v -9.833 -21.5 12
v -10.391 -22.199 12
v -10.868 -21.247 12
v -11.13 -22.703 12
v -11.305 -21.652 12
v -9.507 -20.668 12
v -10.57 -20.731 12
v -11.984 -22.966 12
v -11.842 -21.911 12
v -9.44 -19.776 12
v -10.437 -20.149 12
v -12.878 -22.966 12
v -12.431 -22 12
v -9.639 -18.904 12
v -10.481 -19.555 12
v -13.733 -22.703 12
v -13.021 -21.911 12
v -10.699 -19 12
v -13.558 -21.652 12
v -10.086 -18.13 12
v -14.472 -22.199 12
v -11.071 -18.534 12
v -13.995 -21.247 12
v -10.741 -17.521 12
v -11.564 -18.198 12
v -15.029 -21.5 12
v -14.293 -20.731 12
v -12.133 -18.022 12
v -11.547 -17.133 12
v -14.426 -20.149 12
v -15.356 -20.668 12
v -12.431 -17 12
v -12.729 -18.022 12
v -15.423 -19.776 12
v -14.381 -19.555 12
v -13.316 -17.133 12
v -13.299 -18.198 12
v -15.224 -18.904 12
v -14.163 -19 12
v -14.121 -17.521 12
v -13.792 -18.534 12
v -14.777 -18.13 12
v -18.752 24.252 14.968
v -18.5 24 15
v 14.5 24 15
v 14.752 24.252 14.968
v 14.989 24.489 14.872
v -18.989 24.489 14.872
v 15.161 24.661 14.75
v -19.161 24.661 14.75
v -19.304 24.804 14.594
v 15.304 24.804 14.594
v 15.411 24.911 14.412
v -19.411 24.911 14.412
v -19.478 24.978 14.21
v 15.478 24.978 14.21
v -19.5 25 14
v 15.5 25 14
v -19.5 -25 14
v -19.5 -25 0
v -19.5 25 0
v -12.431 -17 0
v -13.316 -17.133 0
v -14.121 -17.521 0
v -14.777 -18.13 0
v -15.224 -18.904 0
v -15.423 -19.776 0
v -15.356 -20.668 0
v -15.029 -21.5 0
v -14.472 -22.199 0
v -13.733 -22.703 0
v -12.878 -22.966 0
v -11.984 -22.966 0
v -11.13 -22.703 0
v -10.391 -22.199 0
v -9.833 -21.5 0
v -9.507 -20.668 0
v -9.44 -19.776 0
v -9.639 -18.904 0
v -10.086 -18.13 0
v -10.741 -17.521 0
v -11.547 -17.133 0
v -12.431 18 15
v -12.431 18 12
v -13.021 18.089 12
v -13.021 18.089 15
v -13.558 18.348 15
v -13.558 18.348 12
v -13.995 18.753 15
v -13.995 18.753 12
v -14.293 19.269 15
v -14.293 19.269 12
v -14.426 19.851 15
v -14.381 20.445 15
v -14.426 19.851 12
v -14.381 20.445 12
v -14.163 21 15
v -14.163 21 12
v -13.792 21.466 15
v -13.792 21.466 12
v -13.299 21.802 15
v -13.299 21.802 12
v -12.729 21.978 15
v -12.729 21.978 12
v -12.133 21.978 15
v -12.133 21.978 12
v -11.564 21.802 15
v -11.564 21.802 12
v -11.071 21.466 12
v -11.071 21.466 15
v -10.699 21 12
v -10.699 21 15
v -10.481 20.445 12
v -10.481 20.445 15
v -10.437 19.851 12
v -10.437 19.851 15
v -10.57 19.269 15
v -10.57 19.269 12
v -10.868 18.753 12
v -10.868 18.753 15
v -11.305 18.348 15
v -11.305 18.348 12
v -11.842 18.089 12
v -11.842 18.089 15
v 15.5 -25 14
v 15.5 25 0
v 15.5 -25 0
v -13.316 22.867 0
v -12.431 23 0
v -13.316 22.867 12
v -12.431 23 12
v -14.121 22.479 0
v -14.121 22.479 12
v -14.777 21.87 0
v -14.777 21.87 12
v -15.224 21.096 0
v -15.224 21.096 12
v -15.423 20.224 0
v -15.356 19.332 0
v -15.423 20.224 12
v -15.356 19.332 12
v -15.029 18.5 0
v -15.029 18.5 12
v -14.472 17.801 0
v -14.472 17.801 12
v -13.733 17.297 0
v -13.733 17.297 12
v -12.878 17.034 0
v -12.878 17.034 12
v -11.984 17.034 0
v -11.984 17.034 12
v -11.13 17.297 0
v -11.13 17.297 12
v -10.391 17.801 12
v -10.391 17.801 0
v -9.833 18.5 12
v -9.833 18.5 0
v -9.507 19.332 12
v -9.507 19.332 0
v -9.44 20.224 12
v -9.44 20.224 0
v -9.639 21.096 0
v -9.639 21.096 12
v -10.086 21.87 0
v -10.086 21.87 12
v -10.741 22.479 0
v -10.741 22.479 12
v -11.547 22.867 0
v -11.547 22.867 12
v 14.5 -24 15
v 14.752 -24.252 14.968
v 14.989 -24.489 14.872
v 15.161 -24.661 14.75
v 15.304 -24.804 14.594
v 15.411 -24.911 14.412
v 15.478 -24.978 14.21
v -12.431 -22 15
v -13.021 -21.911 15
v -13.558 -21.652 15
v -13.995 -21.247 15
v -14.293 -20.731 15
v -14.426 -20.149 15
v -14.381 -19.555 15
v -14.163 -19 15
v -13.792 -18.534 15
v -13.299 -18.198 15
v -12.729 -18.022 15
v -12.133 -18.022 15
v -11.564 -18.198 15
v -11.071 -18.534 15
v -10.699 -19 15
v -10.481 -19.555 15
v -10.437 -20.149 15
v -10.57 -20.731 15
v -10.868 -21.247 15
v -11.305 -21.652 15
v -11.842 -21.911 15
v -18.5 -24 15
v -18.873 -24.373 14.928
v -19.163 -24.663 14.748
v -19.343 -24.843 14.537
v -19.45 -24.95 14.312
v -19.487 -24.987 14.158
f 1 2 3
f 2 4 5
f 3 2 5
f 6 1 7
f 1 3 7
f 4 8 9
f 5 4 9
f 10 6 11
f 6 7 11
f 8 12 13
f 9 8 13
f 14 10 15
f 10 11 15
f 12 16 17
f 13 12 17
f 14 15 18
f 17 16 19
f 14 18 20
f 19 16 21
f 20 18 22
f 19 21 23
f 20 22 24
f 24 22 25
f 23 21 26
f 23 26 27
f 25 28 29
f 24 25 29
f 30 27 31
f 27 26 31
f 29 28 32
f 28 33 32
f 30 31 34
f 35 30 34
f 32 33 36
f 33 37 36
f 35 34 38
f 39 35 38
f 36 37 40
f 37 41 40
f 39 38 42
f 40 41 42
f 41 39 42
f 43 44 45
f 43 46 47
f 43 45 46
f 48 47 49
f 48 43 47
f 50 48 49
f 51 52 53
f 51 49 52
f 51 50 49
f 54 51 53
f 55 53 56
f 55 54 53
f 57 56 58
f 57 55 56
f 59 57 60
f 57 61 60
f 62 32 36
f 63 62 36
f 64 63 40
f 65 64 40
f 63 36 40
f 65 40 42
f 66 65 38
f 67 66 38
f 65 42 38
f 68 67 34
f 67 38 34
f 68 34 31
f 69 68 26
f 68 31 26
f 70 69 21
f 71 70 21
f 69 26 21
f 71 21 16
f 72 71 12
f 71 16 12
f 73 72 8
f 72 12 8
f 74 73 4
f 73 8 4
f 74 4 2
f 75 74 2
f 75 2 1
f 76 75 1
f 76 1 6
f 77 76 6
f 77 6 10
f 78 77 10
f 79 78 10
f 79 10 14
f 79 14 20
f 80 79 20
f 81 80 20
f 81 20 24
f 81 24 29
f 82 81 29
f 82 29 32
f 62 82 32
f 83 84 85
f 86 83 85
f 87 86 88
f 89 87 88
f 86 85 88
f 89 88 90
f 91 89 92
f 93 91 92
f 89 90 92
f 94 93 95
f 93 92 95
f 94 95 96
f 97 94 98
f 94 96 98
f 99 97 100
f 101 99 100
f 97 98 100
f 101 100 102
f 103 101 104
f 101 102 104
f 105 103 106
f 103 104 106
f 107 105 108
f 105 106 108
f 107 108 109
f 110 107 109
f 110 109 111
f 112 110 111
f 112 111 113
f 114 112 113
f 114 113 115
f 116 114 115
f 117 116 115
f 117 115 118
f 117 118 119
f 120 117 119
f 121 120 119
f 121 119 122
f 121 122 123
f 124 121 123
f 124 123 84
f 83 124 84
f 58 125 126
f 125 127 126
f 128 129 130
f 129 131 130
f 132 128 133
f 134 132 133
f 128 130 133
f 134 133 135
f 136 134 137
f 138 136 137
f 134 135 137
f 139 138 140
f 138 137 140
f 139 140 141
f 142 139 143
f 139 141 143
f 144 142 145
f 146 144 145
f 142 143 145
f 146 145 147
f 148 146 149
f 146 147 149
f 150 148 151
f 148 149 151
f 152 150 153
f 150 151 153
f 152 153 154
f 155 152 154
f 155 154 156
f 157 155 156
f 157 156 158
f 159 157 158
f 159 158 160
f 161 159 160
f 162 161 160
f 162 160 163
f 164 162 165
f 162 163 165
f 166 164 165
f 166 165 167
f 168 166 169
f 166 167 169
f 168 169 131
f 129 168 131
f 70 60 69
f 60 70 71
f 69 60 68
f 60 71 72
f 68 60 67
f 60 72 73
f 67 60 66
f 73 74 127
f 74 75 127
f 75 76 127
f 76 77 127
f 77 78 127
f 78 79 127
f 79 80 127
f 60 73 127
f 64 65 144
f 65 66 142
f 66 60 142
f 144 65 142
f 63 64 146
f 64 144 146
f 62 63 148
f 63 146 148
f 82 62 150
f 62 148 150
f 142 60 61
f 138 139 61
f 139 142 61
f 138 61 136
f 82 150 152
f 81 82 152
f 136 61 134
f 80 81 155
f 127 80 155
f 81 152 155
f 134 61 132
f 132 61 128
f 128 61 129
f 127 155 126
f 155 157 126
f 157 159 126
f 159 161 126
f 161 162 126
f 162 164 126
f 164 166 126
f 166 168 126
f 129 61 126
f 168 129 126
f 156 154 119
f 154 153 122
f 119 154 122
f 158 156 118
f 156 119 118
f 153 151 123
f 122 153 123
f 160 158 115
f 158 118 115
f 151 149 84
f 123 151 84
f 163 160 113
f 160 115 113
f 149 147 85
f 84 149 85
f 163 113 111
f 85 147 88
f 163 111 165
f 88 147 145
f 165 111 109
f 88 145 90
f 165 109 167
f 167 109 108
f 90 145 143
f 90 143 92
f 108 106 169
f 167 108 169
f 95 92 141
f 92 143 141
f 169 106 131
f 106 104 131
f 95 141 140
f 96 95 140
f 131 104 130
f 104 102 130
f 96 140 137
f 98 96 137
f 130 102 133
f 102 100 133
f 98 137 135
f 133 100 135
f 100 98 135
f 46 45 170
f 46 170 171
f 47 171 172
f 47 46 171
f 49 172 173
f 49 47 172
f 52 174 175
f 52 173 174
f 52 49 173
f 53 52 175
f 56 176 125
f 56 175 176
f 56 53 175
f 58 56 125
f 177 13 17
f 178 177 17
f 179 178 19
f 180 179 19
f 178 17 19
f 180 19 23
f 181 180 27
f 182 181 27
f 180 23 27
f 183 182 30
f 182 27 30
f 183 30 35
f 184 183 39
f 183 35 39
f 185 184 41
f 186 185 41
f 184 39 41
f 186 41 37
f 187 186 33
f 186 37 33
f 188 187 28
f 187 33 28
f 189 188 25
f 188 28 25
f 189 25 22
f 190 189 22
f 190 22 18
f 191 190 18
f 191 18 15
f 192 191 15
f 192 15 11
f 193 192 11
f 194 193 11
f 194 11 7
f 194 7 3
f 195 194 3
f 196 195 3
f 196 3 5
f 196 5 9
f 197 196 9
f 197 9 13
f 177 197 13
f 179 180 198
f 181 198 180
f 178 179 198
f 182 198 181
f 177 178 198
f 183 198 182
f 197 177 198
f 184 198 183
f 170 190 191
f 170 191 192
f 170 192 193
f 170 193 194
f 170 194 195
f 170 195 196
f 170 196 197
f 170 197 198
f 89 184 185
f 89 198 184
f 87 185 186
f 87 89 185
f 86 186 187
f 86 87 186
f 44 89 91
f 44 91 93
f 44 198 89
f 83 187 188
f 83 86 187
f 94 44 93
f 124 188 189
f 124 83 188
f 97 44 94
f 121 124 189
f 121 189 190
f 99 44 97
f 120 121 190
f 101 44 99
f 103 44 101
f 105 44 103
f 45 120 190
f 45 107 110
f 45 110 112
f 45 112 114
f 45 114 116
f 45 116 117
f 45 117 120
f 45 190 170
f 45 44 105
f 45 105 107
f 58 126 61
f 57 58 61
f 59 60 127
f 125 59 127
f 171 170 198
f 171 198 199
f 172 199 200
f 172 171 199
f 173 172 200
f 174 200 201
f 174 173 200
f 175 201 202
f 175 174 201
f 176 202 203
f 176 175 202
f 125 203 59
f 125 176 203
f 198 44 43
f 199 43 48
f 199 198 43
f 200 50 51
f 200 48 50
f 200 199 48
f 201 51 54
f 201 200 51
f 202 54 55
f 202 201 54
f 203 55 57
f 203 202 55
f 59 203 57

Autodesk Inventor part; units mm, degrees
ref_plane "YZ Plane" through (0, 0, 0) normal (1, 0, 0) x (0, 1, 0)
ref_plane "XZ Plane" through (0, 0, 0) normal (0, 1, 0) x (-1, 0, 0)
ref_plane "XY Plane" through (0, 0, 0) normal (0, 0, 1) x (1, 0, 0)
ref_plane "Work Plane1" through (0, 0, 0) normal (0, 0, 1) x (1, 0, 0)
sketch "SKbase" plane through (0, 0, 0) normal (0, 0, 1) x (1, 0, 0)
  line L0 (15.5, 25) -> (-19.5, 25)
  line L1 (-19.5, 25) -> (-19.5, -25)
  line L2 (-19.5, -25) -> (15.5, -25)
  line L3 (15.5, -25) -> (15.5, 25)
  point P0 (0, 0)
  point P1 (15.5, 0)
  point P2 (-2, -25)
  dimension "d0" = 35
  dimension "d1" = 50
extrude "EXbase" add sketch "SKbase" along normal blind 15
sketch "Sketch2" plane through (0, 0, 15) normal (0, 0, 1) x (1, 0, 0)
  line L0 (-12.4313, 20) -> (-12.4313, 25)
  line L1 (15.5, 25) -> (-19.5, 25) projected
  line L2 (-12.4313, -20) -> (-12.4313, -25)
  line L3 (-19.5, -25) -> (15.5, -25) projected
  point P0 (0, 0)
  dimension "d6" = 40
hole "Hole1" at (-12.4313, -20, 15) at (-12.4313, 20, 15) direction (0, 0, -1) diameter 4 end through all
fillet "Fillet1" radius 1 4 edges at (15.5, 0, 15) (-2, 25, 15) (-19.5, 0, 15) (-2, -25, 15)
sketch "Sketch3" plane through (0, 0, 0) normal (0, 0, -1) x (-1, 0, 0)
  circle A0 centre (12.4313, 20) radius 2 projected
  circle A1 centre (12.4313, -20) radius 2 projected
  point P0 (0, 0)
hole "Hole2" at (-12.4313, 20, 0) at (-12.4313, -20, 0) direction (0, 0, 1) diameter 6 depth 12
properties part number "optoNCDT_mount"
